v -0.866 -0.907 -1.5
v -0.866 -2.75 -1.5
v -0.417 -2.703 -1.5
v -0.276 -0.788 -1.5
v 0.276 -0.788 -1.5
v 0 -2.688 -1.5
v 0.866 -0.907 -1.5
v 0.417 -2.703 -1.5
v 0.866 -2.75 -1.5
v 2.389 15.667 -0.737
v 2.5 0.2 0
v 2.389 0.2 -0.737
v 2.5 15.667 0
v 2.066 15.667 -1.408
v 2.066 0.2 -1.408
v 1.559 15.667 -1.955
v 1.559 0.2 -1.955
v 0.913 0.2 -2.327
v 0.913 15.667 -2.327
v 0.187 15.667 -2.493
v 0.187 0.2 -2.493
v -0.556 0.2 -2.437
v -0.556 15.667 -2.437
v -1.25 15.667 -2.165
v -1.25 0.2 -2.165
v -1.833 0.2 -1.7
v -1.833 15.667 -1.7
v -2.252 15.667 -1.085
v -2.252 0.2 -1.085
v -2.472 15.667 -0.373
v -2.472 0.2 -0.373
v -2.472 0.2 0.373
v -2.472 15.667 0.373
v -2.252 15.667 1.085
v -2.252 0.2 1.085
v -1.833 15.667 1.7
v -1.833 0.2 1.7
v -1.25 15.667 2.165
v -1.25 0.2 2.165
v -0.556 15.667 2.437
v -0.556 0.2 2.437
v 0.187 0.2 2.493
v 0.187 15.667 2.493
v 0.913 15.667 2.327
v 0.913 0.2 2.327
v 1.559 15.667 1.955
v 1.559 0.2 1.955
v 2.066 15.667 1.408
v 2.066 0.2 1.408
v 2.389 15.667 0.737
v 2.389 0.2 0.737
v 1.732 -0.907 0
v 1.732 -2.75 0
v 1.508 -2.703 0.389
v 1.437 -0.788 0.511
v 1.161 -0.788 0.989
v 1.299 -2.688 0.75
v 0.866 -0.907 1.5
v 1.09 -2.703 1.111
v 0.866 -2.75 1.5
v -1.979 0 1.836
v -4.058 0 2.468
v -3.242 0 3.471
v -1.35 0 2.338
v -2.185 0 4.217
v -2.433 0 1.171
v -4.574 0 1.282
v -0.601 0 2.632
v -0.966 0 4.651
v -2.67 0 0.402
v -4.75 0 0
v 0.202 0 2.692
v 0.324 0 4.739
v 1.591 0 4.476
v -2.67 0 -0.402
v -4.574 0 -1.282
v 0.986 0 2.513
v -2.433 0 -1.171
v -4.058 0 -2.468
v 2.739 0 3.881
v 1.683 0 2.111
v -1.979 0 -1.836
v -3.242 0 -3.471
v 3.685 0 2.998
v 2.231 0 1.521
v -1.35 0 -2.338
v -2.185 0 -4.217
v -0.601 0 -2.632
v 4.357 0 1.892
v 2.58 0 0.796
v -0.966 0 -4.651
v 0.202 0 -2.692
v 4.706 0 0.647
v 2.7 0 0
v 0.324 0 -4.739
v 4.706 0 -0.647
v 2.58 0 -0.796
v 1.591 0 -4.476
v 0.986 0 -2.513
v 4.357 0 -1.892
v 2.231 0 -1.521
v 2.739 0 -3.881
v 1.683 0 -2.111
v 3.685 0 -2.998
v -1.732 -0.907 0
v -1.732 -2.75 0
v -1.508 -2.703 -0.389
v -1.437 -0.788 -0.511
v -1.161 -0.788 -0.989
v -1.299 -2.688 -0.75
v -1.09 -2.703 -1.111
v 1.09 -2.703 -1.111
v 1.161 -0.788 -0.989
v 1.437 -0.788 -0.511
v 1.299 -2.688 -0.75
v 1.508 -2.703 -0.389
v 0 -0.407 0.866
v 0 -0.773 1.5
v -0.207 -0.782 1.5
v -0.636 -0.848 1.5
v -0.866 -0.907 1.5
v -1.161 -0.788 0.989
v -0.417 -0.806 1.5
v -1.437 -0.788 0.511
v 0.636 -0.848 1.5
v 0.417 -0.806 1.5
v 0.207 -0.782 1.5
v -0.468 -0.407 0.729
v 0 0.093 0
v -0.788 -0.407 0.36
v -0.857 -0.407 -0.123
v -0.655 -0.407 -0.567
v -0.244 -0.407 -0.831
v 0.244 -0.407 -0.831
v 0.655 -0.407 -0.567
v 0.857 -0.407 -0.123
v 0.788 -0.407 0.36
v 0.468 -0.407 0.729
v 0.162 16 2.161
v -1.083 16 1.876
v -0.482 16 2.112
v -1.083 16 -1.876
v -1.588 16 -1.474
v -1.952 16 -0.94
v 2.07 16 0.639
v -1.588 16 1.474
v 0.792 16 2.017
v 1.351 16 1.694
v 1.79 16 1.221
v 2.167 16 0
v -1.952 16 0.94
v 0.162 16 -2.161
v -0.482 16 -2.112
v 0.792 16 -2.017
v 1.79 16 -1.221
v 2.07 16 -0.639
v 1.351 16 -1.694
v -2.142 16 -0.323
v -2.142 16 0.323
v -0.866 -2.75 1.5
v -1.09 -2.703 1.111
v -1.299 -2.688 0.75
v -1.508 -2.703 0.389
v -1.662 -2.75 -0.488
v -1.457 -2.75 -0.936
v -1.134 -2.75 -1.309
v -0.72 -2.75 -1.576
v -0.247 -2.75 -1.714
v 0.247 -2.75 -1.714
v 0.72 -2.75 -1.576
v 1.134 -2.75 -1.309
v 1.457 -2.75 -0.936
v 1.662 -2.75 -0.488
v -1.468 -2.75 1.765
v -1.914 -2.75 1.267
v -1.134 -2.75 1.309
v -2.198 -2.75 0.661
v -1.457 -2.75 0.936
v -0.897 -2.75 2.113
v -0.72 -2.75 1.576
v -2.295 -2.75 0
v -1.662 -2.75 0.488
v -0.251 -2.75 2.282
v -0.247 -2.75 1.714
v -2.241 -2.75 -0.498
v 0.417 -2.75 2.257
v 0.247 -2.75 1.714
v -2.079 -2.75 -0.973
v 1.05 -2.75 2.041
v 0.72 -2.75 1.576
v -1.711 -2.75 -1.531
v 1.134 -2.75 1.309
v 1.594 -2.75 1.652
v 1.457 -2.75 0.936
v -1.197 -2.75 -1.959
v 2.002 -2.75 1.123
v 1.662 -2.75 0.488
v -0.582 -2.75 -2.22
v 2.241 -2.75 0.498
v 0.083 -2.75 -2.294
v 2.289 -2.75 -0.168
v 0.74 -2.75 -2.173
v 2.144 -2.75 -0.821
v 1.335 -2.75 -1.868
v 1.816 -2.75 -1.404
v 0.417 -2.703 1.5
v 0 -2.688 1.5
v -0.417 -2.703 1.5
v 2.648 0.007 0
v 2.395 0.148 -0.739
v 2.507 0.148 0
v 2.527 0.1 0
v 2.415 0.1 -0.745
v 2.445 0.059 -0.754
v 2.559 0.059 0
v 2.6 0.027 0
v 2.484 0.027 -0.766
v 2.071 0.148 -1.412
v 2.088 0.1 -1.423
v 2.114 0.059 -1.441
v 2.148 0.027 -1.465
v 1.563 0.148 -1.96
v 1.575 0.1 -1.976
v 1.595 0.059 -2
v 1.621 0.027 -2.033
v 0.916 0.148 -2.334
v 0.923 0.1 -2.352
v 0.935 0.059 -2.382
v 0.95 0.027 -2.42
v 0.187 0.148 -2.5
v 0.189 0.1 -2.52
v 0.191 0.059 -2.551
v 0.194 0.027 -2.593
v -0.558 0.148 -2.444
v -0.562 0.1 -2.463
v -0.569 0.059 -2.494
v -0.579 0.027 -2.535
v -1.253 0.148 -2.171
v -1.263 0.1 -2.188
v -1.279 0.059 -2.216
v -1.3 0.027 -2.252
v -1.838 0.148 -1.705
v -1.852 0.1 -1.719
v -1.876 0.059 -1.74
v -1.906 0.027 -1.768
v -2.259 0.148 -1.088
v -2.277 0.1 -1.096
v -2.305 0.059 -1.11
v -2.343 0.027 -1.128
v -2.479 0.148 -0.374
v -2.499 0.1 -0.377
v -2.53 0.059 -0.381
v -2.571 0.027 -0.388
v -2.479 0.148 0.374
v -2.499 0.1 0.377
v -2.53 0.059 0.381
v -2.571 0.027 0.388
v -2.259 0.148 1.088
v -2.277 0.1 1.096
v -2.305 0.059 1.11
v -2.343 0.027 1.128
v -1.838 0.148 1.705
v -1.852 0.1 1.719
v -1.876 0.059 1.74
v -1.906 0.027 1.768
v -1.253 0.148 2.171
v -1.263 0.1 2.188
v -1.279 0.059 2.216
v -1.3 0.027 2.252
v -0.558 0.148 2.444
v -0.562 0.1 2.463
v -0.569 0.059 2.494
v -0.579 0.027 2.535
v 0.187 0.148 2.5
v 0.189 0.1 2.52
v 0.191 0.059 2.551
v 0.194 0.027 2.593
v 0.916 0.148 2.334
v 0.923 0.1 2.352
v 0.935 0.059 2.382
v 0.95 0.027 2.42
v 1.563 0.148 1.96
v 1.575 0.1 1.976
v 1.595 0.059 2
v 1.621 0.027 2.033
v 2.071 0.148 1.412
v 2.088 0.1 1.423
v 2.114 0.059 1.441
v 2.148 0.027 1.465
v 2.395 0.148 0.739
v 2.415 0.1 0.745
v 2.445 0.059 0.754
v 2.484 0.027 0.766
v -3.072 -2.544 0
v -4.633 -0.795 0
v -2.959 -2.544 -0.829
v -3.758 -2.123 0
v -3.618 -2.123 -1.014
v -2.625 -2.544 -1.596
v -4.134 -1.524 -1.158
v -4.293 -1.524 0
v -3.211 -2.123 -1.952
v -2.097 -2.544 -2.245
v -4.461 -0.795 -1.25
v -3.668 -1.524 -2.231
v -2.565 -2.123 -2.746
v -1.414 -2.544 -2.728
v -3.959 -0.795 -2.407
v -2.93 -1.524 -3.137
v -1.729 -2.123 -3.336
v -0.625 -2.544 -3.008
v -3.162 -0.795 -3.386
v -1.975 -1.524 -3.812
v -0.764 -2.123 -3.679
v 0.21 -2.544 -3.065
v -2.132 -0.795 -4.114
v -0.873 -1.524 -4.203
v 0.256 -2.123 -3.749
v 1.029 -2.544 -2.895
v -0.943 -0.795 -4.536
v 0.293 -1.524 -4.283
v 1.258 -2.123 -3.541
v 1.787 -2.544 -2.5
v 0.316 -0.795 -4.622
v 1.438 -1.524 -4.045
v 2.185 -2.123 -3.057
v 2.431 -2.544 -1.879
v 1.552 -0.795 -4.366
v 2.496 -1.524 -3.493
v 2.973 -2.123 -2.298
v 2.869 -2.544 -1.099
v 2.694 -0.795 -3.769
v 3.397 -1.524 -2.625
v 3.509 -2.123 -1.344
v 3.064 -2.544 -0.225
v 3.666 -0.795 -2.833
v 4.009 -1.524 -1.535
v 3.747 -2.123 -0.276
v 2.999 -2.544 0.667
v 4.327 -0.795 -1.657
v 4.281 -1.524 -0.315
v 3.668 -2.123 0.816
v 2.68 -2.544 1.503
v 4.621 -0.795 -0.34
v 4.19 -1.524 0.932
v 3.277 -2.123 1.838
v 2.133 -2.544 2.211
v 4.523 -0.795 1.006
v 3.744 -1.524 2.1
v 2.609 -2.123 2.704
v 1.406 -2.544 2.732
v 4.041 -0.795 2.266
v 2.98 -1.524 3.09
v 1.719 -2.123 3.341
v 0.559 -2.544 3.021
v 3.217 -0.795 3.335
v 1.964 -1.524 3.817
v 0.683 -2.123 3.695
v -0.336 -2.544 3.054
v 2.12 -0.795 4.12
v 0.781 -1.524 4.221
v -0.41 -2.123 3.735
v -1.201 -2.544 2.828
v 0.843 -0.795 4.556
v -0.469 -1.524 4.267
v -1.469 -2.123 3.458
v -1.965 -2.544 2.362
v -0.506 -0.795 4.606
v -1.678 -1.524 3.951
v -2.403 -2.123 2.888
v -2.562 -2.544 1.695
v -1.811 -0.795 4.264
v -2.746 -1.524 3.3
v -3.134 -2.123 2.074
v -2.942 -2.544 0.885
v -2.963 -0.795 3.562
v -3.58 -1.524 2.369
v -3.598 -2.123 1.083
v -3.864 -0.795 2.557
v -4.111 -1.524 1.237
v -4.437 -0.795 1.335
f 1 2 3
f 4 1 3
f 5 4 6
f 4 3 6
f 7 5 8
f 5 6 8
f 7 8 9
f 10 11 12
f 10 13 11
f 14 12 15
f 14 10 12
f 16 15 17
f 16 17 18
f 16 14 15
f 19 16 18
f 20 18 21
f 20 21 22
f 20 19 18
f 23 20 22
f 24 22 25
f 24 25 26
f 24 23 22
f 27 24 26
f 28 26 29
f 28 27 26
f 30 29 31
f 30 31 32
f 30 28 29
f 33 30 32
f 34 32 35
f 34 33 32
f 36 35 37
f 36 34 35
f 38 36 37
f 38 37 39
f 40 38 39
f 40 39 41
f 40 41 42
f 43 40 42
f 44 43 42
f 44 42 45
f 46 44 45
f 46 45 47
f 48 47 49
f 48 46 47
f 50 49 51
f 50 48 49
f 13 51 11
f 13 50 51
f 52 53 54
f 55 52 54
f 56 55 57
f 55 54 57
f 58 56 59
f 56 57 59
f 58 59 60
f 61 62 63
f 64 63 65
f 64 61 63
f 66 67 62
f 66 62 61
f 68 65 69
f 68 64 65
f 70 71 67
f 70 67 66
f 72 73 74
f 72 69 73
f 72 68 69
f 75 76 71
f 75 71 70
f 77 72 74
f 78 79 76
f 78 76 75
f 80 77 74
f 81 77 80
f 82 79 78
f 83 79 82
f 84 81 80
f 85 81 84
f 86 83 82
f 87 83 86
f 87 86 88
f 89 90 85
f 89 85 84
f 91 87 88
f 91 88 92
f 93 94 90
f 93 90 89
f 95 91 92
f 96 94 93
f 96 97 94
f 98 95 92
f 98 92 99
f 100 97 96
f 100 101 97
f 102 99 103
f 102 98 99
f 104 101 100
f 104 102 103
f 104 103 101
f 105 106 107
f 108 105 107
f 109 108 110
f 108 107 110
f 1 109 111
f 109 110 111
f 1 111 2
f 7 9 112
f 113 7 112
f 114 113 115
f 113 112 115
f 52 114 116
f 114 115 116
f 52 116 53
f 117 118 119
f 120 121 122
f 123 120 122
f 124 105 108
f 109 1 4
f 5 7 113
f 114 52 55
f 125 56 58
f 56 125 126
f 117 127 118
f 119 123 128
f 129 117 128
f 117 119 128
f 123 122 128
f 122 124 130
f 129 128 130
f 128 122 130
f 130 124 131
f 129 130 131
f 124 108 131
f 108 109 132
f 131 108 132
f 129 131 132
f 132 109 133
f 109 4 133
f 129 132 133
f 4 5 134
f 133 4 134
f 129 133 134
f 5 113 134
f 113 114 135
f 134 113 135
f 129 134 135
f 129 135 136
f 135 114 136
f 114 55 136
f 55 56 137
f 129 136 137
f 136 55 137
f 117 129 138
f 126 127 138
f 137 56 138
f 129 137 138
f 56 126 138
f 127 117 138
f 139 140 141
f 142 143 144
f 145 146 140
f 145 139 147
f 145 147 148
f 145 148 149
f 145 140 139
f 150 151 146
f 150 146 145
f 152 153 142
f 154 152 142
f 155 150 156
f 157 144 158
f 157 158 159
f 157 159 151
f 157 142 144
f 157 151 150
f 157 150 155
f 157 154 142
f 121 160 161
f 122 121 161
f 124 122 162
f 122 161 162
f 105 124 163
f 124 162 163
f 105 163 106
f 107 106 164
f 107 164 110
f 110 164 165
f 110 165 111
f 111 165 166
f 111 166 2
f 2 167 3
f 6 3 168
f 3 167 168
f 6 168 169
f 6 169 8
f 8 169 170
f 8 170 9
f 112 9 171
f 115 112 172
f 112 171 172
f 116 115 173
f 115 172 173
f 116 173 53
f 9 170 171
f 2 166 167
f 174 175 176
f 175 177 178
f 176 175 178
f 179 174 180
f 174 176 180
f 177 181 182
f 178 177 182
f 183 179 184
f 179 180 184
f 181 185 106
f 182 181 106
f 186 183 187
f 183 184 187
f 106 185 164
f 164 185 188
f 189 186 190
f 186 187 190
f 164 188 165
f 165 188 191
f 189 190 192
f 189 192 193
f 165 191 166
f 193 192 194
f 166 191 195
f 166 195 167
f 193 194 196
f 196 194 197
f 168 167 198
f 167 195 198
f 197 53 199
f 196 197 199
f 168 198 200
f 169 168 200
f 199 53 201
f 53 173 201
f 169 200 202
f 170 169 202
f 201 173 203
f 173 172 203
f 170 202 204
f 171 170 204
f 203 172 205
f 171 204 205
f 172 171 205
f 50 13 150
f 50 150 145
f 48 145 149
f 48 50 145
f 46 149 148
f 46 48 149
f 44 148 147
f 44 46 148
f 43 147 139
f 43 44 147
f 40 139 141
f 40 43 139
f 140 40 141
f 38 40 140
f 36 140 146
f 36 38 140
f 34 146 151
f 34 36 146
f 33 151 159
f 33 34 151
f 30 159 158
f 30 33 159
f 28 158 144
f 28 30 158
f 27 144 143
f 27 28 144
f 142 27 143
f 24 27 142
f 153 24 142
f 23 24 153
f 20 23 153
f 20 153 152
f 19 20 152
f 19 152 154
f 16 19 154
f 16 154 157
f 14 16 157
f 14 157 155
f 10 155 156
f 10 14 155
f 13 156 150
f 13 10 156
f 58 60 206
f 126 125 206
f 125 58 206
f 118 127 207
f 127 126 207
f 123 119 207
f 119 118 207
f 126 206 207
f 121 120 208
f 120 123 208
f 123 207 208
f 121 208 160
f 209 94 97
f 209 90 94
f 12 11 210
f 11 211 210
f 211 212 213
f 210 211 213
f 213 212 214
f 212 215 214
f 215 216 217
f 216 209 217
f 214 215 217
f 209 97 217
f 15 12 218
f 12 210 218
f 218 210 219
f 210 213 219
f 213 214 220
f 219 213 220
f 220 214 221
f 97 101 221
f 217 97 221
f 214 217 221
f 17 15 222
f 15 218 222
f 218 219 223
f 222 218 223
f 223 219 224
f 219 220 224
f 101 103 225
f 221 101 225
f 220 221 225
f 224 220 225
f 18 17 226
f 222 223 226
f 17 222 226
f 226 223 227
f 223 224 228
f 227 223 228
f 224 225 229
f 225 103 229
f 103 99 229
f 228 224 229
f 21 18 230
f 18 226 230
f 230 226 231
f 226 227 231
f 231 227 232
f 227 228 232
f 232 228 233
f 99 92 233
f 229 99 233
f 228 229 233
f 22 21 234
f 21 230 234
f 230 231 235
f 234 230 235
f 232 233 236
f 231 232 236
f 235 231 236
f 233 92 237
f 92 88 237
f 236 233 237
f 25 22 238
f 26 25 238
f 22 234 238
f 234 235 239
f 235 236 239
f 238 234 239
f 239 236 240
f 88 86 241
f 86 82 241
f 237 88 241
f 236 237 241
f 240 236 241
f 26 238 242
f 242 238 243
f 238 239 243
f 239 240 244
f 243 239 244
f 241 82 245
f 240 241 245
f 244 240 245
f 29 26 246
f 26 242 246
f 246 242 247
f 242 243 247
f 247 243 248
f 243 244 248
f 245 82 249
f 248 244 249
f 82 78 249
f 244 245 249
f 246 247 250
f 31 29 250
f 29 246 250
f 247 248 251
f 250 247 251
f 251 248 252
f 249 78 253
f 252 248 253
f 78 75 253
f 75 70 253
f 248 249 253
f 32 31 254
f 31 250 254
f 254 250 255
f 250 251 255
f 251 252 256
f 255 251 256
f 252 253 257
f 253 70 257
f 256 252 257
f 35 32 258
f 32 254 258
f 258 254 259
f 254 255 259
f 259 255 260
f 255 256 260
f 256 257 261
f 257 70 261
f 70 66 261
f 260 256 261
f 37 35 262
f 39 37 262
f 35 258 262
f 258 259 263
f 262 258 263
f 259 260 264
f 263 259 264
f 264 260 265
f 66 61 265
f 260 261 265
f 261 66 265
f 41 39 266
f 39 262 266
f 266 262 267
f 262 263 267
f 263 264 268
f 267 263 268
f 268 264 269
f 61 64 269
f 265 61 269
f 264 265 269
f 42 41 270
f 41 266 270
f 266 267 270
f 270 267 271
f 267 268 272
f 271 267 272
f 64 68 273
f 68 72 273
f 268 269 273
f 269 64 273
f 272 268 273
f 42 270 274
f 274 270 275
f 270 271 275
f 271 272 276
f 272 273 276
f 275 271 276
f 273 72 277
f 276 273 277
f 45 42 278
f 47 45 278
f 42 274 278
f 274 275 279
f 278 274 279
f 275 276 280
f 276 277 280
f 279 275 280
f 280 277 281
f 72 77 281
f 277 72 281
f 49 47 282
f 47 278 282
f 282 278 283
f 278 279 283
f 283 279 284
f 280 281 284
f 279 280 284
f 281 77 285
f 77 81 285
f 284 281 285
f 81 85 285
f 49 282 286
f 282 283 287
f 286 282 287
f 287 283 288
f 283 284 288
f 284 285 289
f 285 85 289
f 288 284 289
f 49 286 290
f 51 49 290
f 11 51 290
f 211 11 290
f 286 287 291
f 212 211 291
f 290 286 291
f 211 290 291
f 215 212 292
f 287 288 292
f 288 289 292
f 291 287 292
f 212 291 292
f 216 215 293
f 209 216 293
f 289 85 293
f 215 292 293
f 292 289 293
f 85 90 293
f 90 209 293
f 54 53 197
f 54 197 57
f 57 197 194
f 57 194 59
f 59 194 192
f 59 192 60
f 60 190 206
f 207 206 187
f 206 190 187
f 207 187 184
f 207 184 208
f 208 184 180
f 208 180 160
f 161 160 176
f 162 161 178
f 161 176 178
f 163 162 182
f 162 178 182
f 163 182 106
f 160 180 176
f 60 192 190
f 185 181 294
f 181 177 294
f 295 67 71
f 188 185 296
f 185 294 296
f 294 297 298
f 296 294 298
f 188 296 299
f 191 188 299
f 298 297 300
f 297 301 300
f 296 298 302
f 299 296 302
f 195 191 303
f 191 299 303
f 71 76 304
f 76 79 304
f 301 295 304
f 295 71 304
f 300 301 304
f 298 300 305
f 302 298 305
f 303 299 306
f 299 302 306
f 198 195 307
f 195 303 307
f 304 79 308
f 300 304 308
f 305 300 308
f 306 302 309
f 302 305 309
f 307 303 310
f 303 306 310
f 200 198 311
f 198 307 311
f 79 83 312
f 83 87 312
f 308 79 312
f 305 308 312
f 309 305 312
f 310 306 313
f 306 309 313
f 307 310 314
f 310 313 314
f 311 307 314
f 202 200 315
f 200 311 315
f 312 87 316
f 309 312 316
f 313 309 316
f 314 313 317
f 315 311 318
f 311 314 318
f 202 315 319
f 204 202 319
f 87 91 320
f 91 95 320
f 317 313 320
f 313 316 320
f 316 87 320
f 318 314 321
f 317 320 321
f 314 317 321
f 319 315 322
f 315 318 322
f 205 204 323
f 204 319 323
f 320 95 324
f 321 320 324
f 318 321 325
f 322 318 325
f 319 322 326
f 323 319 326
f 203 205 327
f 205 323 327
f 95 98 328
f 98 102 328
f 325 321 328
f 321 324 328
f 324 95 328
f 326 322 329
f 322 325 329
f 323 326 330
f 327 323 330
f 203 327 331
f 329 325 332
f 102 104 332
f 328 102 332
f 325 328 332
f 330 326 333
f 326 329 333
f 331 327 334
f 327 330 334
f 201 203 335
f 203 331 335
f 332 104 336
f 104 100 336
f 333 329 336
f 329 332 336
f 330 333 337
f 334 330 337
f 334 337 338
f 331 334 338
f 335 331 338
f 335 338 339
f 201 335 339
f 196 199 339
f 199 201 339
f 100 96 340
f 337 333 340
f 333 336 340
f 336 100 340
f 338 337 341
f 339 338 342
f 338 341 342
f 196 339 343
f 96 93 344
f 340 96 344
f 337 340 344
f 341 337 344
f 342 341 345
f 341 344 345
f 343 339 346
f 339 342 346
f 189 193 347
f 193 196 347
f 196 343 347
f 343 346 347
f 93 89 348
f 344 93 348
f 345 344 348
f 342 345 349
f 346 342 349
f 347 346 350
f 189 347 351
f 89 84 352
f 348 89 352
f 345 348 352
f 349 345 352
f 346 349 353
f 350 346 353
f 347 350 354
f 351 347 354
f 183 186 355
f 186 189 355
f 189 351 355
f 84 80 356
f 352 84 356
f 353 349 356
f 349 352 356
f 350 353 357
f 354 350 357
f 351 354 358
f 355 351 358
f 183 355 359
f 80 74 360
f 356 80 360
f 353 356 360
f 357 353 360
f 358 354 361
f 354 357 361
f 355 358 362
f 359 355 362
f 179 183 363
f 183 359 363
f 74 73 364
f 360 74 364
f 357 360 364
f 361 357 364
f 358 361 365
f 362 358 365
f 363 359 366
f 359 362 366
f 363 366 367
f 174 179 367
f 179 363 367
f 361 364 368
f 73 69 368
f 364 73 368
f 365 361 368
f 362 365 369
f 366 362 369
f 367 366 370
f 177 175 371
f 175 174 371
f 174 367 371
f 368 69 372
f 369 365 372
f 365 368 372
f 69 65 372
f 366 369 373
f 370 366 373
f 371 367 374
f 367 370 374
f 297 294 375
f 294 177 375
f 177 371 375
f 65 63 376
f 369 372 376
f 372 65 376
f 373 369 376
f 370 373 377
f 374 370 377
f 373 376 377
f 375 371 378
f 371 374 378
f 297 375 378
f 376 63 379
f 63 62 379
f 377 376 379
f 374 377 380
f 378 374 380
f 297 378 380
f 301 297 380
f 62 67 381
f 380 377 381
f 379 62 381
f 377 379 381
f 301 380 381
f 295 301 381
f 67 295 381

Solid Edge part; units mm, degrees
sketch "Sketch1" plane through (0, 0, 0) normal (0, 0, 1) x (1, 0, 0)
  line L0 (2.5, 0) -> (2.5, 16)
  line L1 (0, 16) -> (2.5, 16)
  line L2 (0, 0) -> (0, 16)
  line L3 (0, 0) -> (0, -2.75)
  line L4 (0, -2.75) -> (4.75, -2.75)
  line L5 (4.75, -2.75) -> (4.75, 0)
  line L6 (4.75, 0) -> (2.5, 0)
revolve "RevolvedProtrusion1" add sketch "Sketch1" angle 360 about axis through (0, 0, 0) along (0, 1, 0)
sketch "Sketch2" plane through (0, 0, 0) normal (1, 0, 0) x (0, 1, 0)
  line L0 (-2.75, 2.2215) -> (-1.19, 2.2215)
  line L1 (0.0926, 0) -> (-1.19, 2.2215)
  line L2 (-2.75, 0) -> (0.0926, 0)
  line L3 (-2.75, 0) -> (-2.75, 2.2215)
revolve "RevolvedCutout1" cut sketch "Sketch2" angle 360 about axis through (0, -4.5, 0) along (0, 1, 0)
sketch "Sketch3" plane through (0, -2.75, 0) normal (0, -1, 0) x (0, 0, 1)
  circle A0 centre (0, 0) radius 2.2215
  line L0 (-1.5, -0.866) -> (0, -1.7321)
  line L1 (0, -1.7321) -> (1.5, -0.866)
  line L2 (1.5, -0.866) -> (1.5, 0.866)
  line L3 (1.5, 0.866) -> (0, 1.7321)
  line L4 (0, 1.7321) -> (-1.5, 0.866)
  line L5 (-1.5, 0.866) -> (-1.5, -0.866)
  dimension "D1" = 3
extrude "Protrusion1" add sketch "Sketch3" against normal up to next
sketch "Sketch4" plane through (0, 0, 0) normal (0, 0, 1) x (1, 0, 0)
  line L0 (-1.7321, -2.75) -> (0, -2.75)
  line L1 (0, -2.75) -> (0, -2.2859)
  line L2 (0, -2.2859) -> (-1.7321, -2.75)
revolve "RevolvedCutout2" cut sketch "Sketch4" angle 360 about axis through (0, -4.5, 0) along (0, 1, 0)
fillet "Round1" radius 0.2 1 edges at (0, 0, -2.5)
chamfer "倒斜角_2" distance 0.3333 angle 45 1 edges at (0, 16, -2.5)
cosmetic_thread "螺纹_3" size "M5" thread depth 14.4
sketch "Sketch5" plane through (0, 0, 0) normal (0, 0, 1) x (1, 0, 0)
  arc A0 (-2.2953, -2.75) -> (-4.75, 0) centre (-1.9822, 0) cw
revolve "RevolvedCutout3" cut sketch "Sketch5" angle 360 about axis through (0, 0, 0) along (0, -1, 0) material side at (-4.0844, -1.8764, 0)
